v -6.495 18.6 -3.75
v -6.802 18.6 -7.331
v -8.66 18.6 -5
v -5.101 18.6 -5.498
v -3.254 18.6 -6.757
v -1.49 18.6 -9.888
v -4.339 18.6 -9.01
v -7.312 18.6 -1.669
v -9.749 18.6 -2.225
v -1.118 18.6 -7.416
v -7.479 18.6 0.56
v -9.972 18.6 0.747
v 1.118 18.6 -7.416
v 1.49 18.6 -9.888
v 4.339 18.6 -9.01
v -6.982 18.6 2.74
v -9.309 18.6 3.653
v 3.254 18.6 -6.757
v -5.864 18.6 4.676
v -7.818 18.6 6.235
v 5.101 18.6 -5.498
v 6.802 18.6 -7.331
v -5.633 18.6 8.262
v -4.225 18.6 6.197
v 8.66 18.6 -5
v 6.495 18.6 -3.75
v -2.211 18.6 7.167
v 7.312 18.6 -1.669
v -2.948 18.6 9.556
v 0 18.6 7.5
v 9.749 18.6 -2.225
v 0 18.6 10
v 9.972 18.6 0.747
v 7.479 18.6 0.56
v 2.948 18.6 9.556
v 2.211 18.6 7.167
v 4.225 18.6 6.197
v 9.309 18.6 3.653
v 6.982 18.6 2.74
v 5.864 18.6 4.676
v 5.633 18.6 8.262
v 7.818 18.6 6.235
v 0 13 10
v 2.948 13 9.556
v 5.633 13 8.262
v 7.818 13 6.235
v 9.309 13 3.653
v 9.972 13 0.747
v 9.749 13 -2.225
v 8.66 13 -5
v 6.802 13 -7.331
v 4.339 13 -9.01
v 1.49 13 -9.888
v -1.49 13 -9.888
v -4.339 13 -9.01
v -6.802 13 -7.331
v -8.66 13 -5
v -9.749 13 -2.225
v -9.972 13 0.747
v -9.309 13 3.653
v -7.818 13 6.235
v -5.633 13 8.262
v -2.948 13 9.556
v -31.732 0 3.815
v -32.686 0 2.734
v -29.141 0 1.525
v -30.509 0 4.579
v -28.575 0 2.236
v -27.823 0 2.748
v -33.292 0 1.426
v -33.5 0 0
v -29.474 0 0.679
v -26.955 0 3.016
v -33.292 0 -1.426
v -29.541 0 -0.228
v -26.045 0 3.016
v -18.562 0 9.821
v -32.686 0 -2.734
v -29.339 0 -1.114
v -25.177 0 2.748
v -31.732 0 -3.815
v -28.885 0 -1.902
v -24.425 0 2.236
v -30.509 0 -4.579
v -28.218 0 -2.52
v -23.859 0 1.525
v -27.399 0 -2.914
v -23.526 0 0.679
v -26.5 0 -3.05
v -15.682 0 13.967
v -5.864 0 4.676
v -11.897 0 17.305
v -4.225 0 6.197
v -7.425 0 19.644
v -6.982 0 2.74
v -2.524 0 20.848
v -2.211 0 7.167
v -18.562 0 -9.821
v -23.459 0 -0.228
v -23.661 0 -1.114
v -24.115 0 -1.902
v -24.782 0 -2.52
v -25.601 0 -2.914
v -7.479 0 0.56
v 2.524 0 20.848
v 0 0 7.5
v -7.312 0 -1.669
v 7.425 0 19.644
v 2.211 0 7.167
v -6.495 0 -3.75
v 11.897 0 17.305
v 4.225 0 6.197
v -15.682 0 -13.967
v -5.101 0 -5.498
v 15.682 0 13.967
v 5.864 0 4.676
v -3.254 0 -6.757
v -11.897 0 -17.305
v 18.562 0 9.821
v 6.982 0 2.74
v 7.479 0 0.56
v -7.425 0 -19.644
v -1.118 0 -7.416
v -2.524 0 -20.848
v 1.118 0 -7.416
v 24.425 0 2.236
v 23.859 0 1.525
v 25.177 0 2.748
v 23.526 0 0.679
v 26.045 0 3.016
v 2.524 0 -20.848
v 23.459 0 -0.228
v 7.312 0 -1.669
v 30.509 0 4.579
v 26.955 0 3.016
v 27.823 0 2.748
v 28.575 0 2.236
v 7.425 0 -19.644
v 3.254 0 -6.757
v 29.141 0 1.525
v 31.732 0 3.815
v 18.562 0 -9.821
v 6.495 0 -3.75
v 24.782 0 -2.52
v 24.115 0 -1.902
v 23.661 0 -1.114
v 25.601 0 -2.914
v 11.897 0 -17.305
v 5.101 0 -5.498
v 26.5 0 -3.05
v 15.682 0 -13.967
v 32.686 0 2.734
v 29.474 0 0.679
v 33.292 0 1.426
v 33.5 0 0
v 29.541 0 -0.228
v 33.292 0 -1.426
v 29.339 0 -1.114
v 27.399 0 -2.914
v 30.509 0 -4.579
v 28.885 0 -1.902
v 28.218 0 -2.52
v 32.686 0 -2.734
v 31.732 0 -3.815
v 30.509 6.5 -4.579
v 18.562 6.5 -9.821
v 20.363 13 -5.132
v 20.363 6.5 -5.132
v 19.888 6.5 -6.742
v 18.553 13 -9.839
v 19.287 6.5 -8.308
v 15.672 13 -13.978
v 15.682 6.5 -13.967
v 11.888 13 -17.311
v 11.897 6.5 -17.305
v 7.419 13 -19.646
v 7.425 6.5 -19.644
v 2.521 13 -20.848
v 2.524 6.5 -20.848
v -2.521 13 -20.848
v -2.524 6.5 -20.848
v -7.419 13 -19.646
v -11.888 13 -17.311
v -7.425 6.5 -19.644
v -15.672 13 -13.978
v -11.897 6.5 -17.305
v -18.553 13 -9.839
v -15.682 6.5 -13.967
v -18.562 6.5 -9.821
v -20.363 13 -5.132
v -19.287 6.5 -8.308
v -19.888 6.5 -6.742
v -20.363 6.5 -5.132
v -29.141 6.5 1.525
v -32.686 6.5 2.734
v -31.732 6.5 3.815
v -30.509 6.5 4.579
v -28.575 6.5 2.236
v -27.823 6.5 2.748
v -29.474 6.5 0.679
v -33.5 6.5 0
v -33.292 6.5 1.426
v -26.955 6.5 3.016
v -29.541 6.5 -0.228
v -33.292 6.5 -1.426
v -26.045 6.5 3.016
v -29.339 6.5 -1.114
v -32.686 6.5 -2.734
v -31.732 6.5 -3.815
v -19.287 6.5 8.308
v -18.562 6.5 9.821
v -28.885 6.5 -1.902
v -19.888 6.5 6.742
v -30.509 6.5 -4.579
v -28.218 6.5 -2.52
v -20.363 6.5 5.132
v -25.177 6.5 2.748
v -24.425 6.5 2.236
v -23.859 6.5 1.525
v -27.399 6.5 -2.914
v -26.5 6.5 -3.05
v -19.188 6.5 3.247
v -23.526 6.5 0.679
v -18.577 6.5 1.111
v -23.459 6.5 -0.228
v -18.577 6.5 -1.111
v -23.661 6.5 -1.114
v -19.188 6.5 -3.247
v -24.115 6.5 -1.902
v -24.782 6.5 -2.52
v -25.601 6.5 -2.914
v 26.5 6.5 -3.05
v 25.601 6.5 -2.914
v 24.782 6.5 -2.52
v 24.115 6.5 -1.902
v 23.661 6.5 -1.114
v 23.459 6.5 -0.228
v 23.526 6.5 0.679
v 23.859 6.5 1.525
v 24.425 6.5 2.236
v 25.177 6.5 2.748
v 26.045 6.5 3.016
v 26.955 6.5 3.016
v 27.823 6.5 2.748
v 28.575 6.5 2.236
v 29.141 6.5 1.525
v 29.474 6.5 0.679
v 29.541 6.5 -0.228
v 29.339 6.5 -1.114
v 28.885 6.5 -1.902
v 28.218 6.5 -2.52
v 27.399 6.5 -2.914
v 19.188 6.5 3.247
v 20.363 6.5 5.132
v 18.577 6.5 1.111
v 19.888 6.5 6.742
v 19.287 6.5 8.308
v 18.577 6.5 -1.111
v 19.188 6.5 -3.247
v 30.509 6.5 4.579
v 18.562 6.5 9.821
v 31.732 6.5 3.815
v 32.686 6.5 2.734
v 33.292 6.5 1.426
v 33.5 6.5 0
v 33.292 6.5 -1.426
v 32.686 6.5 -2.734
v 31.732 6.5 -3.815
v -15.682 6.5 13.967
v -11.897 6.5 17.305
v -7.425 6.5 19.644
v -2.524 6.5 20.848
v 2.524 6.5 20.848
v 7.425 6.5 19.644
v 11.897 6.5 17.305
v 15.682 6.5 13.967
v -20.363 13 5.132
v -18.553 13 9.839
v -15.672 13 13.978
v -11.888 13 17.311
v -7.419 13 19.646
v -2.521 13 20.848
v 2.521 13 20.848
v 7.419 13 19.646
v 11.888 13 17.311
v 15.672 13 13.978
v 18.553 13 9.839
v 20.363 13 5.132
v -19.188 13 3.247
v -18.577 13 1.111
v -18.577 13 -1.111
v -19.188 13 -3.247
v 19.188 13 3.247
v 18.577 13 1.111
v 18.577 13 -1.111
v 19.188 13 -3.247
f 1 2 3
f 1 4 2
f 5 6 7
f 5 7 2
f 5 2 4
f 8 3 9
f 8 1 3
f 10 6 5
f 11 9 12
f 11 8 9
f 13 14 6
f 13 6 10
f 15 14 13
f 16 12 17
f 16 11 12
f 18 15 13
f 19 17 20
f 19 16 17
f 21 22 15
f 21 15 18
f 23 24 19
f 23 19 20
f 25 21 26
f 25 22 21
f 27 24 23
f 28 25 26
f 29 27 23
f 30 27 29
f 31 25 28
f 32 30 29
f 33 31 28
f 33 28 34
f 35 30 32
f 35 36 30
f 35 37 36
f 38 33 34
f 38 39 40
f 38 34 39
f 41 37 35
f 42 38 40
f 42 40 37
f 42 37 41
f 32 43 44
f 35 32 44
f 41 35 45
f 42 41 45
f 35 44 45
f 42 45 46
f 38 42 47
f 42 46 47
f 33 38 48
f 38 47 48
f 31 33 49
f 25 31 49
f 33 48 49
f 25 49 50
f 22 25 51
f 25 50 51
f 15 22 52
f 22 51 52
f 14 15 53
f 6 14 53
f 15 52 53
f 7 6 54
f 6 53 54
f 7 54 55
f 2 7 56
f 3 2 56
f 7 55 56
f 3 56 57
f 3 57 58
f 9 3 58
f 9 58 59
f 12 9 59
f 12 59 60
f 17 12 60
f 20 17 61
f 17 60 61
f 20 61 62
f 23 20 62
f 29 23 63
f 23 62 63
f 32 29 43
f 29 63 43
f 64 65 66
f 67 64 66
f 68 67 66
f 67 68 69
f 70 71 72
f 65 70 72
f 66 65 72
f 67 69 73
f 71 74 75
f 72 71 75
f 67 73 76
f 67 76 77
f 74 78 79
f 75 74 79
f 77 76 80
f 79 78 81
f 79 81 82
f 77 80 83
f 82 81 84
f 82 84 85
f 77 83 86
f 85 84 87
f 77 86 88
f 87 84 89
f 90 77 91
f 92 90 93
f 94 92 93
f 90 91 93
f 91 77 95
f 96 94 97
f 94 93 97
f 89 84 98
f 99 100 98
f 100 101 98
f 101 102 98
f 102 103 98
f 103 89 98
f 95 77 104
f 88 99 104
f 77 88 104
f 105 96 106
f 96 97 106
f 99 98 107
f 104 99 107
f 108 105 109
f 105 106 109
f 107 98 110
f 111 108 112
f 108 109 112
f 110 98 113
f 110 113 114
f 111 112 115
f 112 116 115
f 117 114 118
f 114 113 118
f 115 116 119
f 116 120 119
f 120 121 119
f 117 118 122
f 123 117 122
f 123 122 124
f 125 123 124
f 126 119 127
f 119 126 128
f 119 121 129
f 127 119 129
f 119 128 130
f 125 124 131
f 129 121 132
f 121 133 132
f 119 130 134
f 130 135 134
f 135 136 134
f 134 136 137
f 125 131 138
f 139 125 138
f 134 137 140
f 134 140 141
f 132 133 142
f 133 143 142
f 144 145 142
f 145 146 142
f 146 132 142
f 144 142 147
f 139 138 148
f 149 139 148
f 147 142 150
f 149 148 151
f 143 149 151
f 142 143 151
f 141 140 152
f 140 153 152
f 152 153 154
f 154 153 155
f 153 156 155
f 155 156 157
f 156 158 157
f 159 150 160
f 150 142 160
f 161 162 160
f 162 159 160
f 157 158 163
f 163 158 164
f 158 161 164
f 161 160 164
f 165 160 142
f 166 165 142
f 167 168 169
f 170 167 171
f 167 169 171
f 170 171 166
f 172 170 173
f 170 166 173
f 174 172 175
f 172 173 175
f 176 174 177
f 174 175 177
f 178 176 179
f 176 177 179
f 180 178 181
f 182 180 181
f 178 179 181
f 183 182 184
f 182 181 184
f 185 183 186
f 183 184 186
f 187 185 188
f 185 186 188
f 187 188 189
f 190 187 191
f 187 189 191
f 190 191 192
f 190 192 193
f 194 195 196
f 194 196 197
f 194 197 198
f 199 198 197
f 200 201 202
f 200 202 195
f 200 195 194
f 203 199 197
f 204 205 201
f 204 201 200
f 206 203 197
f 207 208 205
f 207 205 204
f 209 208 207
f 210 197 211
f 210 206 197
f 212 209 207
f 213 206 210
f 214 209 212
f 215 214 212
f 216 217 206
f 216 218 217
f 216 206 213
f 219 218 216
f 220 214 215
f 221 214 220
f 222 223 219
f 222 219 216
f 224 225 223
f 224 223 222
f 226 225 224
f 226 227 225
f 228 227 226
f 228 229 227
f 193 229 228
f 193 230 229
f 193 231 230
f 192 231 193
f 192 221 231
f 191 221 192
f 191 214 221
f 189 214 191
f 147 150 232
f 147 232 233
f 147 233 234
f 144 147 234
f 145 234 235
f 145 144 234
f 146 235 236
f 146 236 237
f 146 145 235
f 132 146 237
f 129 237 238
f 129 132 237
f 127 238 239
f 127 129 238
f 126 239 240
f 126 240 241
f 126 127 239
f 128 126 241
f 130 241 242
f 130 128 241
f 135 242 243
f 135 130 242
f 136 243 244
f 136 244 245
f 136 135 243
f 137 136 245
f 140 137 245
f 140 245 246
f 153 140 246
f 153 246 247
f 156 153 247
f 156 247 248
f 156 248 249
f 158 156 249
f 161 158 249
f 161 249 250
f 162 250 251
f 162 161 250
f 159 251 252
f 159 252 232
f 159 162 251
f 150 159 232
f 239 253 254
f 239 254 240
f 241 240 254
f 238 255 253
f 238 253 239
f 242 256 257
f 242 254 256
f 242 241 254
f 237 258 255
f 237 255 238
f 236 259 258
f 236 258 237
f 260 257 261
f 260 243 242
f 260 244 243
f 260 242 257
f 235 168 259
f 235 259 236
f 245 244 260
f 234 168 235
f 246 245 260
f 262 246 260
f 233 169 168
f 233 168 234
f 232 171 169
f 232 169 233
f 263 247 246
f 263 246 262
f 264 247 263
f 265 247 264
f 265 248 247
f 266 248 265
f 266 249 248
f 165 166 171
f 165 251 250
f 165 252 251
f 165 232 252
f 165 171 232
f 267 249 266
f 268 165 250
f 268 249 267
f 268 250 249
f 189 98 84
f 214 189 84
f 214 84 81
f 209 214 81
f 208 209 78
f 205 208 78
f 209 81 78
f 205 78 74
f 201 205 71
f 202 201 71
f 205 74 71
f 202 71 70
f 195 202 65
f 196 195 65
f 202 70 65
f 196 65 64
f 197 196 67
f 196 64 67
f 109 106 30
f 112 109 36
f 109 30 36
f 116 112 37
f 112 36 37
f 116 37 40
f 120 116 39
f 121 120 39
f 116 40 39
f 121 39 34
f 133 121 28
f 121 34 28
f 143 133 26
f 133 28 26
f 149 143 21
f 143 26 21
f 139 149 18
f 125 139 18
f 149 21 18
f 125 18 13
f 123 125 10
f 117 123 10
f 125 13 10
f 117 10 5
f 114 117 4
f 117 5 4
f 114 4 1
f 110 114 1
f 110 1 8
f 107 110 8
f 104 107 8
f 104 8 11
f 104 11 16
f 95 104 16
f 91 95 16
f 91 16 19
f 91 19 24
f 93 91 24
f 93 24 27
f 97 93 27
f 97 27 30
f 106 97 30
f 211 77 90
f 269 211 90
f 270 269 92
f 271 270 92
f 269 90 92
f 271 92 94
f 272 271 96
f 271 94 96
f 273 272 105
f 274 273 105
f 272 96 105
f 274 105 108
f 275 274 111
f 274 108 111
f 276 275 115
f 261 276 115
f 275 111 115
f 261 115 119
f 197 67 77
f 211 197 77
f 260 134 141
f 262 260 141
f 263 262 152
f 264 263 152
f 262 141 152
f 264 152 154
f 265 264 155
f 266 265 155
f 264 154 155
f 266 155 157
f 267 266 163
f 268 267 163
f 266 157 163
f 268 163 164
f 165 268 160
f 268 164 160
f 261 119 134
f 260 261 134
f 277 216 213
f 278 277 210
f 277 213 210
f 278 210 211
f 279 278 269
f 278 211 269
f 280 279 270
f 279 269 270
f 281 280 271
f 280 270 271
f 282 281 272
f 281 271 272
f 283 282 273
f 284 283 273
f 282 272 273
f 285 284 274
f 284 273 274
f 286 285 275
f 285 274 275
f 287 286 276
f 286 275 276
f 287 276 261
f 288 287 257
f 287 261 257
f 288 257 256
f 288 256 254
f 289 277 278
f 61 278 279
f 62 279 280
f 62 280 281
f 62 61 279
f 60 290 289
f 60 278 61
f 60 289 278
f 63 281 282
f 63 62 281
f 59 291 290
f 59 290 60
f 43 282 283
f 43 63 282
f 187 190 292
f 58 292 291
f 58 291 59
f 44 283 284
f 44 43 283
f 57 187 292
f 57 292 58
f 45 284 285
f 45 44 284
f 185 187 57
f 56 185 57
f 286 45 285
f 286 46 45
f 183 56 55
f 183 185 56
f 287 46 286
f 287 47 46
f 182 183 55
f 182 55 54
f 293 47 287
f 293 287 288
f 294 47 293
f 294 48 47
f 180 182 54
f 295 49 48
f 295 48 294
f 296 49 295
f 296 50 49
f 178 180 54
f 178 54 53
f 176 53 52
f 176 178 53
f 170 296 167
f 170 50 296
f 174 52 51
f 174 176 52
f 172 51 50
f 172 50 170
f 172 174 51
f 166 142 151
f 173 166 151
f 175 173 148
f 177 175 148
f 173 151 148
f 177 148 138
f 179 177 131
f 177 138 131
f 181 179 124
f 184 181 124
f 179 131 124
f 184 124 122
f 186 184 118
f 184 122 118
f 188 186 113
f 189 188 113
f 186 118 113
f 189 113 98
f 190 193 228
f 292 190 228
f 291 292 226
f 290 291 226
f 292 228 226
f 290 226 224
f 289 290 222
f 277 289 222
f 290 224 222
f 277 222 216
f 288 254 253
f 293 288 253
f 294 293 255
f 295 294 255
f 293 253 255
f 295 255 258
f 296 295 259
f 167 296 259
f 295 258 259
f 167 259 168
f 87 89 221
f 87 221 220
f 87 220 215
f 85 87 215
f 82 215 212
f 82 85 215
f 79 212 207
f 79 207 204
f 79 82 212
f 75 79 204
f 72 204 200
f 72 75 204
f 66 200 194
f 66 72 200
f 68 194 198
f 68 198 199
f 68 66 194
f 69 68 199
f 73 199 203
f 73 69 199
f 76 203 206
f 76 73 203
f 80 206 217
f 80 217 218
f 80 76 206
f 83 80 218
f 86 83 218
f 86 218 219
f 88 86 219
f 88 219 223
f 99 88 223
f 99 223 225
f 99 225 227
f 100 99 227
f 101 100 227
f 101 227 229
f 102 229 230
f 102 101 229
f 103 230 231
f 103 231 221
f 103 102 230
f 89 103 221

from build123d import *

# Parameters (mm, degrees)
SKETCH3_R           = 3.05
BOSS_EXTRUDE1_DEPTH = 6.5
BOSS_EXTRUDE2_DEPTH = 6.5
SKETCH5_R           = 10
BOSS_EXTRUDE3_DEPTH = 5.6
SKETCH6_R           = 7.5
CUT_EXTRUDE1_DEPTH  = 44.694507664


with BuildPart() as part:
    # Sketch3 → Boss-Extrude1 (new body)
    # profile 1 of 5: a face of its own
    with BuildSketch(Plane(origin=(0, 0, 0), x_dir=(1, 0, 0), z_dir=(0, 1, 0))):
        with BuildLine():
            Line((0, -17.966933692), (-18.56176162, -9.821456387))
            ThreePointArc((-18.56176162, -9.821456387), (0, -21), (18.56176162, -9.821456387))
            Line((18.56176162, -9.821456387), (0, -17.966933692))
        make_face()
    # profile 2 of 5: a face of its own
    with BuildSketch(Plane(origin=(0, 0, 0), x_dir=(1, 0, 0), z_dir=(0, 1, 0))):
        with BuildLine():
            Line((0, 17.966933692), (-18.56176162, 9.821456387))
            ThreePointArc((-18.56176162, 9.821456387), (-21, 0), (-18.56176162, -9.821456387))
            Line((-18.56176162, -9.821456387), (0, -17.966933692))
            Line((0, -17.966933692), (18.56176162, -9.821456387))
            ThreePointArc((18.56176162, -9.821456387), (20.381327165, -5.059792782), (21, 0))
            ThreePointArc((21, 0), (20.381327165, 5.059792782), (18.56176162, 9.821456387))
            Line((18.56176162, 9.821456387), (0, 17.966933692))
        make_face()
    # profile 3 of 5: a face of its own
    with BuildSketch(Plane(origin=(0, 0, 0), x_dir=(1, 0, 0), z_dir=(0, 1, 0))):
        with BuildLine():
            ThreePointArc((18.56176162, 9.821456387), (0, 21), (-18.56176162, 9.821456387))
            Line((-18.56176162, 9.821456387), (0, 17.966933692))
            Line((0, 17.966933692), (18.56176162, 9.821456387))
        make_face()
    # profile 4 of 5: a face of its own
    with BuildSketch(Plane(origin=(0, 0, 0), x_dir=(1, 0, 0), z_dir=(0, 1, 0))):
        with BuildLine():
            Line((30.509208106, 4.578545925), (18.56176162, 9.821456387))
            ThreePointArc((18.56176162, 9.821456387), (20.381327165, 5.059792782), (21, 0))
            ThreePointArc((21, 0), (20.381327165, -5.059792782), (18.56176162, -9.821456387))
            Line((18.56176162, -9.821456387), (30.509208106, -4.578545925))
            ThreePointArc((30.509208106, -4.578545925), (33.5, 0), (30.509208106, 4.578545925))
        make_face()
        with Locations(Location((26.5, 0, 0), (0, 0, 90))):
            Circle(SKETCH3_R, mode=Mode.SUBTRACT)
    # profile 5 of 5: a face of its own
    with BuildSketch(Plane(origin=(0, 0, 0), x_dir=(1, 0, 0), z_dir=(0, 1, 0))):
        with BuildLine():
            Line((-18.56176162, 9.821456387), (-30.509208106, 4.578545925))
            ThreePointArc((-30.509208106, 4.578545925), (-33.5, 0), (-30.509208106, -4.578545925))
            Line((-30.509208106, -4.578545925), (-18.56176162, -9.821456387))
            ThreePointArc((-18.56176162, -9.821456387), (-21, 0), (-18.56176162, 9.821456387))
        make_face()
        with Locations(Location((-26.5, 0, 0), (0, 0, 90))):
            Circle(SKETCH3_R, mode=Mode.SUBTRACT)
    extrude(amount=BOSS_EXTRUDE1_DEPTH)

    # Sketch4 → Boss-Extrude2 (add)
    with BuildSketch(Plane(origin=(0, 6.5, 0), x_dir=(1, 0, 0), z_dir=(0, 1, 0))):
        with BuildLine():
            ThreePointArc((20.363207547, 5.132229378), (0, 21), (-20.363207547, 5.132229378))
            ThreePointArc((-20.363207547, 5.132229378), (-18.5, 0), (-20.363207547, -5.132229378))
            ThreePointArc((-20.363207547, -5.132229378), (0, -21), (20.363207547, -5.132229378))
            ThreePointArc((20.363207547, -5.132229378), (18.5, 0), (20.363207547, 5.132229378))
        make_face()
    extrude(amount=BOSS_EXTRUDE2_DEPTH)

    # Sketch5 → Boss-Extrude3 (add)
    with BuildSketch(Plane(origin=(0, 13, 0), x_dir=(1, 0, 0), z_dir=(0, 1, 0))):
        with Locations(Location((0, 0, 0), (0, 0, 270))):
            Circle(SKETCH5_R)
    extrude(amount=BOSS_EXTRUDE3_DEPTH)

    # Sketch6 → Cut-Extrude1 (cut, through all)
    with BuildSketch(Plane(origin=(0, 18.6, 0), x_dir=(1, 0, 0), z_dir=(0, 1, 0))):
        with Locations(Location((0, 0, 0), (0, 0, 270))):
            Circle(SKETCH6_R)
    extrude(amount=-CUT_EXTRUDE1_DEPTH, mode=Mode.SUBTRACT)


solid = part.part
